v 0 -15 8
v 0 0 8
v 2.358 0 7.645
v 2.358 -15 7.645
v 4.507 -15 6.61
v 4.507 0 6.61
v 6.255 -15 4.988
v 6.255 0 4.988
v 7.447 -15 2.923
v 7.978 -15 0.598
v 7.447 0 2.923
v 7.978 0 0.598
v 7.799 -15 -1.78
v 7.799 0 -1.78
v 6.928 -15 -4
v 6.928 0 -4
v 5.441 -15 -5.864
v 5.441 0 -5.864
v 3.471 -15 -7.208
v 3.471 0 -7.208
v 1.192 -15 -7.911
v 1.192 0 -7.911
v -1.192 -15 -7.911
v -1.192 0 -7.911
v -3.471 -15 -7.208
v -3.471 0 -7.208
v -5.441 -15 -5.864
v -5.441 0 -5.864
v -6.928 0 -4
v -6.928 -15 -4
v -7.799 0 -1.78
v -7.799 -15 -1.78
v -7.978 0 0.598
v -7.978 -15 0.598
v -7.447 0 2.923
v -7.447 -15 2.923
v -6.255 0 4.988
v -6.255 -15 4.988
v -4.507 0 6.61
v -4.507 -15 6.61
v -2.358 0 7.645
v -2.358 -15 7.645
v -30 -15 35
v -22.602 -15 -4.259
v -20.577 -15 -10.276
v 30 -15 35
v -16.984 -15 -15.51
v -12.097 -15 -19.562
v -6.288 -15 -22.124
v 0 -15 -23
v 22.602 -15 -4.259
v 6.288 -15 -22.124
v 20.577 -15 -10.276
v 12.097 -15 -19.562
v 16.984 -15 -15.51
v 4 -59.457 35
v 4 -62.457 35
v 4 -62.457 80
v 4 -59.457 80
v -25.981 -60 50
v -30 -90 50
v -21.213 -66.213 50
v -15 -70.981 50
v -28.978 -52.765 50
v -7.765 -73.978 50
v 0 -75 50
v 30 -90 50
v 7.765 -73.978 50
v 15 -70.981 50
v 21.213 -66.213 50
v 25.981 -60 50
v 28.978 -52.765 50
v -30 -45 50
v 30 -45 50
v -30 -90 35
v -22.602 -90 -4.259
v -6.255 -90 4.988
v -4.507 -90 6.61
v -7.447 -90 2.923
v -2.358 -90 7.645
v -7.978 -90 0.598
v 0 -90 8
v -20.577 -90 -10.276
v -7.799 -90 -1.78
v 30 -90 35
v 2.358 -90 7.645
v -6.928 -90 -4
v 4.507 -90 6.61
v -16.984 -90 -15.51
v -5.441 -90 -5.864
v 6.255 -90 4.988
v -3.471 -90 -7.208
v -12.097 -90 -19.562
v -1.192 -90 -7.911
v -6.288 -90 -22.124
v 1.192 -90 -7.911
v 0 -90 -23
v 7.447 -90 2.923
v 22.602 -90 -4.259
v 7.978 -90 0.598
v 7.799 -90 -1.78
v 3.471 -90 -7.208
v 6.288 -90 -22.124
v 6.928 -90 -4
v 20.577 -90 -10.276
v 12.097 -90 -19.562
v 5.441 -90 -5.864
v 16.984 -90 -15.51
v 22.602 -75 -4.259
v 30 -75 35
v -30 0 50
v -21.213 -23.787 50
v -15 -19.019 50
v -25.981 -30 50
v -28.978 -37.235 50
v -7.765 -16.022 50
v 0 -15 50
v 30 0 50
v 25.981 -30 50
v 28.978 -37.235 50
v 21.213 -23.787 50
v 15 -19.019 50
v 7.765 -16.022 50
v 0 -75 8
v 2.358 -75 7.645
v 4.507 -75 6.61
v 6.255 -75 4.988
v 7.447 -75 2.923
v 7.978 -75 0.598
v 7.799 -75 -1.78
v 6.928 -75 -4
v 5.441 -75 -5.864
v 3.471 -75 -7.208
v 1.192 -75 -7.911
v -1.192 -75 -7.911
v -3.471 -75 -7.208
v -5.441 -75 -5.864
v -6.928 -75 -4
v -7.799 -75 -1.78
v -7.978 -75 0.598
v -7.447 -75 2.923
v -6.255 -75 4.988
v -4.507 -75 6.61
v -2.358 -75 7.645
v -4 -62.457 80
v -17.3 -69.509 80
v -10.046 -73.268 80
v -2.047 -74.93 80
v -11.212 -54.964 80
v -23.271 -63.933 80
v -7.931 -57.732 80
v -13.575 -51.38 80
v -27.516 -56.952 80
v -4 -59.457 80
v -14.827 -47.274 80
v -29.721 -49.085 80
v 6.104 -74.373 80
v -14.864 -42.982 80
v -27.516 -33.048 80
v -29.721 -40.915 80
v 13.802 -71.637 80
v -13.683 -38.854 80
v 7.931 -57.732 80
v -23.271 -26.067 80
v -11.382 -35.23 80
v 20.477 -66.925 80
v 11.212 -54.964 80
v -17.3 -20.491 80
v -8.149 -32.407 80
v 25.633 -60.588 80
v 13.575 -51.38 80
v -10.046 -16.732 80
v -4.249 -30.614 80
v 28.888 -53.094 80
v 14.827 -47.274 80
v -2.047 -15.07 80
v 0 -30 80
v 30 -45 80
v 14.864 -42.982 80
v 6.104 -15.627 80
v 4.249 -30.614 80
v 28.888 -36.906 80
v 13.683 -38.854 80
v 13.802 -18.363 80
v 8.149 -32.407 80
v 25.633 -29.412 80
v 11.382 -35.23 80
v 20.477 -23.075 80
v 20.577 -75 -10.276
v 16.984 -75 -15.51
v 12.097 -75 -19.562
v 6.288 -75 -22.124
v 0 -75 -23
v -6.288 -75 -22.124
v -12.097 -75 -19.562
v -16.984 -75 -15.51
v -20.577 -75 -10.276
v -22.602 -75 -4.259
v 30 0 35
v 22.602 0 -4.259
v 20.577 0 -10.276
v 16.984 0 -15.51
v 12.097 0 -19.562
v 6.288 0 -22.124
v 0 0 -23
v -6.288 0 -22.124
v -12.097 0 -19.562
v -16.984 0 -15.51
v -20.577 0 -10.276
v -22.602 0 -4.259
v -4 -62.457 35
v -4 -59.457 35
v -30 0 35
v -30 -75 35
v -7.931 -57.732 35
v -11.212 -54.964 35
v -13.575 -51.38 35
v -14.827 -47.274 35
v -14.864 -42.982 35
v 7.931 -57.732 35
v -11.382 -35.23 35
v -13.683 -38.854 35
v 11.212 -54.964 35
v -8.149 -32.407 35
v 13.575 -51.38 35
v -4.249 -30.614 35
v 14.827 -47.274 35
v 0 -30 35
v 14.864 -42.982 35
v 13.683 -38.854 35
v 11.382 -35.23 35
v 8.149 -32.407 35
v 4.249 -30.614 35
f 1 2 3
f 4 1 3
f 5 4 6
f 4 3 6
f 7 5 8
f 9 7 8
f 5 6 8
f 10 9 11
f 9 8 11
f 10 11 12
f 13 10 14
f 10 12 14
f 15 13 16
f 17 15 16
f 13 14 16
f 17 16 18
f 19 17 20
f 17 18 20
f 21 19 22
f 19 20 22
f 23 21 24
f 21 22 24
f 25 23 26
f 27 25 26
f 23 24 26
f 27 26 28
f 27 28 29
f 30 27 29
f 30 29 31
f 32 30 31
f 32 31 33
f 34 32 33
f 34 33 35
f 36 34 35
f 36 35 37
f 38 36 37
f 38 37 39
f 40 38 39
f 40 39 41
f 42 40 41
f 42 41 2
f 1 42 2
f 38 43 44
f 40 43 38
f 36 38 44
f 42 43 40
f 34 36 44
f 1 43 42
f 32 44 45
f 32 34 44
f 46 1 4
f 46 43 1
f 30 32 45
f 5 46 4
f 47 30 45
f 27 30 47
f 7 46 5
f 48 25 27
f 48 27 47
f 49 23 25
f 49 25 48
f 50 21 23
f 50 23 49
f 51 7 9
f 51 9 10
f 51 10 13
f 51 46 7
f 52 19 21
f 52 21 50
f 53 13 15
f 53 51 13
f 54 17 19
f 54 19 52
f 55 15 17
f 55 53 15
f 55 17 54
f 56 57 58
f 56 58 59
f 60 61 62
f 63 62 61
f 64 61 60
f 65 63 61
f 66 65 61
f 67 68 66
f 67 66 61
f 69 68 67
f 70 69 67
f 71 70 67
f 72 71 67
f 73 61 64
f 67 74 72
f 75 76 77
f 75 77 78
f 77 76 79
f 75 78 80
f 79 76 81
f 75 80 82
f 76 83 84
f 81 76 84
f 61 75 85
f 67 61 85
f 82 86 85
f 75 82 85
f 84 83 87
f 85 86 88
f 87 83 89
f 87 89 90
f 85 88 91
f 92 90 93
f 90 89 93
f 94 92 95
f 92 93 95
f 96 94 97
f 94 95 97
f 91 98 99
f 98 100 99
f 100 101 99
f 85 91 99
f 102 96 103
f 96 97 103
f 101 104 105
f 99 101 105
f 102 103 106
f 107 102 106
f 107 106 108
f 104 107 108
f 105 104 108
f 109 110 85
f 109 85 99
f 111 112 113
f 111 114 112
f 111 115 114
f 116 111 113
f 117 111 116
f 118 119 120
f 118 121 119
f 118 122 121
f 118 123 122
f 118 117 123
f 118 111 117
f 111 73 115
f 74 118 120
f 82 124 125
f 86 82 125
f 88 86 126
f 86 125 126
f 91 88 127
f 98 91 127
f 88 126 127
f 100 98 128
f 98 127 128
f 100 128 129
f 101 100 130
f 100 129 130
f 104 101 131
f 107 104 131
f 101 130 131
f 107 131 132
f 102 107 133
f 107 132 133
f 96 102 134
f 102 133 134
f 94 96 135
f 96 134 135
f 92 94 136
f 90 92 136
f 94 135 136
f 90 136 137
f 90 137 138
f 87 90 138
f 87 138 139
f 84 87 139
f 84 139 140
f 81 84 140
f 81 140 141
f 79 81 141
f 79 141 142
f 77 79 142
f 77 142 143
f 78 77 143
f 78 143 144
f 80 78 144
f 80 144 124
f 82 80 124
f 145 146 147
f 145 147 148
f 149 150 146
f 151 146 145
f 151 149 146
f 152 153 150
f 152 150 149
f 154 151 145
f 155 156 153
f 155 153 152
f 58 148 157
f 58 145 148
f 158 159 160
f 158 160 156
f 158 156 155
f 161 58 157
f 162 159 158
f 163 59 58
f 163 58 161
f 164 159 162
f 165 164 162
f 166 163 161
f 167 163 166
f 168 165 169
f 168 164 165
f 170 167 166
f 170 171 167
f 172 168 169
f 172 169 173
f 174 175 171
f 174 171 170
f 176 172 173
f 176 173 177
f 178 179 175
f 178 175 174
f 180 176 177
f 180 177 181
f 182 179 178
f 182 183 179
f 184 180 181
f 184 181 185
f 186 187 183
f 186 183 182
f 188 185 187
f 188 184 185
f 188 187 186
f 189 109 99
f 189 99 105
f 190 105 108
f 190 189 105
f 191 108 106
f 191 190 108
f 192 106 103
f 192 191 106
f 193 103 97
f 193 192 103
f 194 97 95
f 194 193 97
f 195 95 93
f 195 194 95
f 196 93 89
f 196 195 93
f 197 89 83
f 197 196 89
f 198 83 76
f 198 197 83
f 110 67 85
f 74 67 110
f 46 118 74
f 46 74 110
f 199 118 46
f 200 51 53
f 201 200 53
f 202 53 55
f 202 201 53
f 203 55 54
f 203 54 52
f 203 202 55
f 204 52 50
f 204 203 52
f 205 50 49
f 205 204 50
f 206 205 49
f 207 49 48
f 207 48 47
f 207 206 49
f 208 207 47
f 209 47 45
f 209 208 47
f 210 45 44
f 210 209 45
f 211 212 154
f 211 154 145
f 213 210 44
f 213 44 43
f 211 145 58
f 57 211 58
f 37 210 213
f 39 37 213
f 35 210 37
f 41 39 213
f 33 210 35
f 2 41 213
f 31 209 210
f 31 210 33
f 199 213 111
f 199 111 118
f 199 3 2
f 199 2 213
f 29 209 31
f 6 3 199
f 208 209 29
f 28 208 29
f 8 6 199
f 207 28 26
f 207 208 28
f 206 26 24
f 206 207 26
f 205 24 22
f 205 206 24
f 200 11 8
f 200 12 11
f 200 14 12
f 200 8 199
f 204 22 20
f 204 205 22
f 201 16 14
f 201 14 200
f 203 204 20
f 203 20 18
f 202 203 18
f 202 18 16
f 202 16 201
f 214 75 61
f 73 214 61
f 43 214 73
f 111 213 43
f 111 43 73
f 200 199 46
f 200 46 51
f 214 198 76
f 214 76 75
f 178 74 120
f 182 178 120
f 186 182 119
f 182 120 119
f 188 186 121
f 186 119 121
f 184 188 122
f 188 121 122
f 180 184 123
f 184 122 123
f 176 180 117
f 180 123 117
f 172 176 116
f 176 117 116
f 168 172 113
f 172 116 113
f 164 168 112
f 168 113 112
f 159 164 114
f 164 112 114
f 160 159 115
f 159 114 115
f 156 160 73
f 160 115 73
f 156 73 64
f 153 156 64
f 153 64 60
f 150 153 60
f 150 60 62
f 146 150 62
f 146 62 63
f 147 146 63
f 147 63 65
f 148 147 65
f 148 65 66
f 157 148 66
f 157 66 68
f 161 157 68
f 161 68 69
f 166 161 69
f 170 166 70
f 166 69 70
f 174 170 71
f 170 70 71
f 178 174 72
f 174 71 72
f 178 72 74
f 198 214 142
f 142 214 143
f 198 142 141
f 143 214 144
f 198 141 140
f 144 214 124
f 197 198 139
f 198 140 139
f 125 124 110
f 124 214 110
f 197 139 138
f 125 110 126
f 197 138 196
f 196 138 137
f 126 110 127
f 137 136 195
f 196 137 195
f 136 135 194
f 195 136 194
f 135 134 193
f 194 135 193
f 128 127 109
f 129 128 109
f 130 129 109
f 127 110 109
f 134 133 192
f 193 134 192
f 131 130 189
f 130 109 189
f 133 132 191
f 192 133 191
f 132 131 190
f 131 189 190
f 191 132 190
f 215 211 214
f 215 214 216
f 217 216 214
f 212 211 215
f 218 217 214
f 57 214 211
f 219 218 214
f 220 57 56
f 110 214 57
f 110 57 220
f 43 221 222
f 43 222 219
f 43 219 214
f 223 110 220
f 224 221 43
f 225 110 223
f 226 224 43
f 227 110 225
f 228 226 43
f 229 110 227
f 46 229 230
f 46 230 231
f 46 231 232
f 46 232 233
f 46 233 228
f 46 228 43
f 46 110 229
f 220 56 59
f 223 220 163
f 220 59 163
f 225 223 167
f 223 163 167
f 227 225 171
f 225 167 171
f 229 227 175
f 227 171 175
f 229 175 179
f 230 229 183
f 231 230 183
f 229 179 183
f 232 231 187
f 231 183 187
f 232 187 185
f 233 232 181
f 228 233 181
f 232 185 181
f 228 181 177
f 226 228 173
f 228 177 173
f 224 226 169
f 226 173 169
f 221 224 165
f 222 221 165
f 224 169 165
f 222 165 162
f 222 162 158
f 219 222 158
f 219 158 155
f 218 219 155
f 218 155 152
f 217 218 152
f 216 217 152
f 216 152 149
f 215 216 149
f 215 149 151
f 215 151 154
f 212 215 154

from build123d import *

# Parameters (mm, degrees)
SKETCH2_R           = 8
BOSS_EXTRUDE1_DEPTH = 90
SKETCH3_R           = 30
BOSS_EXTRUDE2_DEPTH = 30
CUT_EXTRUDE1_DEPTH  = 141.032139168
SKETCH5_W           = 58
SKETCH5_H           = 60
CUT_EXTRUDE2_DEPTH  = 135.536240597


with BuildPart() as part:
    # Sketch2 → Boss-Extrude1 (new body)
    with BuildSketch(Plane(origin=(0, 0, 0), x_dir=(1, 0, 0), z_dir=(0, 1, 0))):
        with BuildLine():
            Line((30, -35), (22.602223441, 4.259048664))
            ThreePointArc((22.602223441, 4.259048664), (0, 23), (-22.602223441, 4.259048664))
            Line((-22.602223441, 4.259048664), (-30, -35))
            Line((-30, -35), (-30, -50))
            Line((-30, -50), (30, -50))
            Line((30, -50), (30, -35))
        make_face()
        with Locations(Location((0, 0, 0), (0, 0, 270))):
            Circle(SKETCH2_R, mode=Mode.SUBTRACT)
    extrude(amount=-BOSS_EXTRUDE1_DEPTH)

    # Sketch3 → Boss-Extrude2 (add)
    with BuildSketch(Plane.XY.offset(50)):
        with Locations((0, -45)):
            Circle(SKETCH3_R)
    extrude(amount=BOSS_EXTRUDE2_DEPTH)

    # Sketch4 → Cut-Extrude1 (cut, through all)
    with BuildSketch(Plane.XY.offset(80)):
        with BuildLine():
            Line((-4, -62.456832295), (4, -62.456832295))
            Line((4, -62.456832295), (4, -59.456832295))
            ThreePointArc((4, -59.456832295), (0, -30), (-4, -59.456832295))
            Line((-4, -59.456832295), (-4, -62.456832295))
        make_face()
    extrude(amount=-CUT_EXTRUDE1_DEPTH, mode=Mode.SUBTRACT)

    # Sketch5 → Cut-Extrude2 (cut, through all)
    with BuildSketch(Plane(origin=(30, 0, 0), x_dir=(0, 0, -1), z_dir=(1, 0, 0))):
        with Locations((-6, -45)):
            Rectangle(SKETCH5_W, SKETCH5_H)
    extrude(amount=-CUT_EXTRUDE2_DEPTH, mode=Mode.SUBTRACT)


solid = part.part
